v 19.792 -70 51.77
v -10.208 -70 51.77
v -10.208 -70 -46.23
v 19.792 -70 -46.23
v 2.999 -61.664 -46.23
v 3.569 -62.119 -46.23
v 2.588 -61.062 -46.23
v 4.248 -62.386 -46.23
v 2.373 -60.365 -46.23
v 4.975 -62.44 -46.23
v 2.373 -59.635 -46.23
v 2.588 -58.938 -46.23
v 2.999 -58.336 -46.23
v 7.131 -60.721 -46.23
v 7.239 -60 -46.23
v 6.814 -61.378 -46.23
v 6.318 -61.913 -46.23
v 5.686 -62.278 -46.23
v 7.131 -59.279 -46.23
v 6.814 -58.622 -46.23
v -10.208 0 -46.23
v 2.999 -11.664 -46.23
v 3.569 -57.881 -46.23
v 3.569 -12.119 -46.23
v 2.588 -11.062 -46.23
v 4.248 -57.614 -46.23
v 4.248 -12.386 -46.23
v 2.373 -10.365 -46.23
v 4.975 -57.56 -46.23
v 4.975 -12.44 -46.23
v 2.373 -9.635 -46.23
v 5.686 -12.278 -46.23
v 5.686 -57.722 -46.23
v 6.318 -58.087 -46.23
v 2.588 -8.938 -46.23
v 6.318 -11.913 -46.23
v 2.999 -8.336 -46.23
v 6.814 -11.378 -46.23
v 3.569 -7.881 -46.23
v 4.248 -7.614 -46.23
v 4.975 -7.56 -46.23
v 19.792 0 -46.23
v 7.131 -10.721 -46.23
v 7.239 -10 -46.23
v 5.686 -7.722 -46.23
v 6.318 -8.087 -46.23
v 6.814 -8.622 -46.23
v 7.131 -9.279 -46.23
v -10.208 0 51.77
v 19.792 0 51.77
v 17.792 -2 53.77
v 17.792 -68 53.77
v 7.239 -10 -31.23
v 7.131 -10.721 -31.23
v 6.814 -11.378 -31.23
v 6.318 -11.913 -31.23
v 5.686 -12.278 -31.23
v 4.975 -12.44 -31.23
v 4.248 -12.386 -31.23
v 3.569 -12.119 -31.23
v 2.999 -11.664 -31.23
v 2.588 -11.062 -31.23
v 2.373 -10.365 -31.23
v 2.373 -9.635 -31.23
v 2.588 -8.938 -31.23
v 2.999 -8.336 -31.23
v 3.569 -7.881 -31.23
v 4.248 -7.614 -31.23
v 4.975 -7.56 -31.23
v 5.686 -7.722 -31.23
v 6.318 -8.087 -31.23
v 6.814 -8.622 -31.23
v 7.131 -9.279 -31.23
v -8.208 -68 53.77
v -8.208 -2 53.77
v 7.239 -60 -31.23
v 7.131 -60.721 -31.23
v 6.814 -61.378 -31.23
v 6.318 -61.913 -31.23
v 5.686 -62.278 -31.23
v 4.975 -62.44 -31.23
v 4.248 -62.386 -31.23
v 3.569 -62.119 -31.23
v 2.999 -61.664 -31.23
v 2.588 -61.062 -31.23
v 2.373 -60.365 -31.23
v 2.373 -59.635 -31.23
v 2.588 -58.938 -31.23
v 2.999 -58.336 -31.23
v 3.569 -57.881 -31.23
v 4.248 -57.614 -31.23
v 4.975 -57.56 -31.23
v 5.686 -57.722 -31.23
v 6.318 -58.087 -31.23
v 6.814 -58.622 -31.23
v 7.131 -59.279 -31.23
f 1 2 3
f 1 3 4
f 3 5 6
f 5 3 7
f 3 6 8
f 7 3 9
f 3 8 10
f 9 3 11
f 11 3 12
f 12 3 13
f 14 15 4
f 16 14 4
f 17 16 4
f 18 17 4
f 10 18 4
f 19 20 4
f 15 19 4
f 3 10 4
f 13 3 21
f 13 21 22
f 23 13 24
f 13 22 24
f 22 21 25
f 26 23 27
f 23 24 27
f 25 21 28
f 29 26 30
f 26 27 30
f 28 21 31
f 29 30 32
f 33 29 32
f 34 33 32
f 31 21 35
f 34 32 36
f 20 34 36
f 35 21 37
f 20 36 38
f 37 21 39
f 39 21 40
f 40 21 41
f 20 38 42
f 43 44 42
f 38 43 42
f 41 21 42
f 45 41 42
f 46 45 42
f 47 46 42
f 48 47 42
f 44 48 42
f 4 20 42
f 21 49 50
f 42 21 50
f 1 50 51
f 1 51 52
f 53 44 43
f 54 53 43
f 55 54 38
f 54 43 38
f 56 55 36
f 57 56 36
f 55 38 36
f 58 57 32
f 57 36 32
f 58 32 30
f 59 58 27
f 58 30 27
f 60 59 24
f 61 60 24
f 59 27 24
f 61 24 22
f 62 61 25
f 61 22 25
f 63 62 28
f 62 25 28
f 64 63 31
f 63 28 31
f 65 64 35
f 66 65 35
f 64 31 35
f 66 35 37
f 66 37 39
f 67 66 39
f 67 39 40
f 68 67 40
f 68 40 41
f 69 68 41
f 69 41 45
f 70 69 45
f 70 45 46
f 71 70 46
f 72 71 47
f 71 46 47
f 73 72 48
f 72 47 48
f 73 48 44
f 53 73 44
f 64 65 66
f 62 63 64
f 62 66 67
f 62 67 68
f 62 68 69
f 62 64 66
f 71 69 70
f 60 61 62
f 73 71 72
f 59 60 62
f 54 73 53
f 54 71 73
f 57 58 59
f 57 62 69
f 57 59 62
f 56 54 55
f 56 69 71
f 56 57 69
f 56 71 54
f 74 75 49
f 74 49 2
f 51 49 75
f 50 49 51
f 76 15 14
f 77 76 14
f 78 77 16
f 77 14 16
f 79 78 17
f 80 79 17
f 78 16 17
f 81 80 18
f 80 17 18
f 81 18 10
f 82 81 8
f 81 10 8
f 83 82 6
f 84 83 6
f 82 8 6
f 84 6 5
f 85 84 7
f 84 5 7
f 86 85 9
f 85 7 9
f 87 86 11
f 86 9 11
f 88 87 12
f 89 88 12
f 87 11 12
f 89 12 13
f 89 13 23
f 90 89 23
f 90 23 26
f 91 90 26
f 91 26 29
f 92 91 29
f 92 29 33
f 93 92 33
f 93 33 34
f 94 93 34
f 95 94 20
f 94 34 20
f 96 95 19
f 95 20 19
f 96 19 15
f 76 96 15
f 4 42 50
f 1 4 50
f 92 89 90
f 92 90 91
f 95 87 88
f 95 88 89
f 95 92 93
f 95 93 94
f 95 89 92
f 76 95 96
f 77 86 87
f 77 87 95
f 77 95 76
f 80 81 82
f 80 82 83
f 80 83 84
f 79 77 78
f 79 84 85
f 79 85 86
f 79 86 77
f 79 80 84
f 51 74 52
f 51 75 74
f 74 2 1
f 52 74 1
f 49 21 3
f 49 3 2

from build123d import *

# Parameters (mm, degrees)
F0_W     = 30
F0_H     = 100
F1_DEPTH = 70
F2_R     = 2.446969
F3_DEPTH = 15
F4_SIZE  = 2


with BuildPart() as f1:
    # F0 (on Front) → F1 (new body)
    with BuildSketch(Plane.XZ):
        with Locations((4.792286, 3.770108)):
            Rectangle(F0_W, F0_H)
    extrude(amount=F1_DEPTH)

    # F2 (on face) → F3 (cut)
    with BuildSketch(Plane(origin=(0, 0, -46.229892), x_dir=(1, 0, 0), z_dir=(0, 0, -1))):
        with Locations((4.792286, 60)):
            Circle(F2_R)
        with Locations((4.792286, 10)):
            Circle(F2_R)
    extrude(amount=-F3_DEPTH, mode=Mode.SUBTRACT)

    # F4
    f4_edges = [f1.edges().sort_by_distance(p)[0] for p in [
        (4.792286, -70, 53.770108),
        (19.792286, -35, 53.770108),
        (4.792286, 0, 53.770108),
        (-10.207714, -35, 53.770108),
    ]]
    chamfer(f4_edges, length=F4_SIZE)


solid = f1.part
